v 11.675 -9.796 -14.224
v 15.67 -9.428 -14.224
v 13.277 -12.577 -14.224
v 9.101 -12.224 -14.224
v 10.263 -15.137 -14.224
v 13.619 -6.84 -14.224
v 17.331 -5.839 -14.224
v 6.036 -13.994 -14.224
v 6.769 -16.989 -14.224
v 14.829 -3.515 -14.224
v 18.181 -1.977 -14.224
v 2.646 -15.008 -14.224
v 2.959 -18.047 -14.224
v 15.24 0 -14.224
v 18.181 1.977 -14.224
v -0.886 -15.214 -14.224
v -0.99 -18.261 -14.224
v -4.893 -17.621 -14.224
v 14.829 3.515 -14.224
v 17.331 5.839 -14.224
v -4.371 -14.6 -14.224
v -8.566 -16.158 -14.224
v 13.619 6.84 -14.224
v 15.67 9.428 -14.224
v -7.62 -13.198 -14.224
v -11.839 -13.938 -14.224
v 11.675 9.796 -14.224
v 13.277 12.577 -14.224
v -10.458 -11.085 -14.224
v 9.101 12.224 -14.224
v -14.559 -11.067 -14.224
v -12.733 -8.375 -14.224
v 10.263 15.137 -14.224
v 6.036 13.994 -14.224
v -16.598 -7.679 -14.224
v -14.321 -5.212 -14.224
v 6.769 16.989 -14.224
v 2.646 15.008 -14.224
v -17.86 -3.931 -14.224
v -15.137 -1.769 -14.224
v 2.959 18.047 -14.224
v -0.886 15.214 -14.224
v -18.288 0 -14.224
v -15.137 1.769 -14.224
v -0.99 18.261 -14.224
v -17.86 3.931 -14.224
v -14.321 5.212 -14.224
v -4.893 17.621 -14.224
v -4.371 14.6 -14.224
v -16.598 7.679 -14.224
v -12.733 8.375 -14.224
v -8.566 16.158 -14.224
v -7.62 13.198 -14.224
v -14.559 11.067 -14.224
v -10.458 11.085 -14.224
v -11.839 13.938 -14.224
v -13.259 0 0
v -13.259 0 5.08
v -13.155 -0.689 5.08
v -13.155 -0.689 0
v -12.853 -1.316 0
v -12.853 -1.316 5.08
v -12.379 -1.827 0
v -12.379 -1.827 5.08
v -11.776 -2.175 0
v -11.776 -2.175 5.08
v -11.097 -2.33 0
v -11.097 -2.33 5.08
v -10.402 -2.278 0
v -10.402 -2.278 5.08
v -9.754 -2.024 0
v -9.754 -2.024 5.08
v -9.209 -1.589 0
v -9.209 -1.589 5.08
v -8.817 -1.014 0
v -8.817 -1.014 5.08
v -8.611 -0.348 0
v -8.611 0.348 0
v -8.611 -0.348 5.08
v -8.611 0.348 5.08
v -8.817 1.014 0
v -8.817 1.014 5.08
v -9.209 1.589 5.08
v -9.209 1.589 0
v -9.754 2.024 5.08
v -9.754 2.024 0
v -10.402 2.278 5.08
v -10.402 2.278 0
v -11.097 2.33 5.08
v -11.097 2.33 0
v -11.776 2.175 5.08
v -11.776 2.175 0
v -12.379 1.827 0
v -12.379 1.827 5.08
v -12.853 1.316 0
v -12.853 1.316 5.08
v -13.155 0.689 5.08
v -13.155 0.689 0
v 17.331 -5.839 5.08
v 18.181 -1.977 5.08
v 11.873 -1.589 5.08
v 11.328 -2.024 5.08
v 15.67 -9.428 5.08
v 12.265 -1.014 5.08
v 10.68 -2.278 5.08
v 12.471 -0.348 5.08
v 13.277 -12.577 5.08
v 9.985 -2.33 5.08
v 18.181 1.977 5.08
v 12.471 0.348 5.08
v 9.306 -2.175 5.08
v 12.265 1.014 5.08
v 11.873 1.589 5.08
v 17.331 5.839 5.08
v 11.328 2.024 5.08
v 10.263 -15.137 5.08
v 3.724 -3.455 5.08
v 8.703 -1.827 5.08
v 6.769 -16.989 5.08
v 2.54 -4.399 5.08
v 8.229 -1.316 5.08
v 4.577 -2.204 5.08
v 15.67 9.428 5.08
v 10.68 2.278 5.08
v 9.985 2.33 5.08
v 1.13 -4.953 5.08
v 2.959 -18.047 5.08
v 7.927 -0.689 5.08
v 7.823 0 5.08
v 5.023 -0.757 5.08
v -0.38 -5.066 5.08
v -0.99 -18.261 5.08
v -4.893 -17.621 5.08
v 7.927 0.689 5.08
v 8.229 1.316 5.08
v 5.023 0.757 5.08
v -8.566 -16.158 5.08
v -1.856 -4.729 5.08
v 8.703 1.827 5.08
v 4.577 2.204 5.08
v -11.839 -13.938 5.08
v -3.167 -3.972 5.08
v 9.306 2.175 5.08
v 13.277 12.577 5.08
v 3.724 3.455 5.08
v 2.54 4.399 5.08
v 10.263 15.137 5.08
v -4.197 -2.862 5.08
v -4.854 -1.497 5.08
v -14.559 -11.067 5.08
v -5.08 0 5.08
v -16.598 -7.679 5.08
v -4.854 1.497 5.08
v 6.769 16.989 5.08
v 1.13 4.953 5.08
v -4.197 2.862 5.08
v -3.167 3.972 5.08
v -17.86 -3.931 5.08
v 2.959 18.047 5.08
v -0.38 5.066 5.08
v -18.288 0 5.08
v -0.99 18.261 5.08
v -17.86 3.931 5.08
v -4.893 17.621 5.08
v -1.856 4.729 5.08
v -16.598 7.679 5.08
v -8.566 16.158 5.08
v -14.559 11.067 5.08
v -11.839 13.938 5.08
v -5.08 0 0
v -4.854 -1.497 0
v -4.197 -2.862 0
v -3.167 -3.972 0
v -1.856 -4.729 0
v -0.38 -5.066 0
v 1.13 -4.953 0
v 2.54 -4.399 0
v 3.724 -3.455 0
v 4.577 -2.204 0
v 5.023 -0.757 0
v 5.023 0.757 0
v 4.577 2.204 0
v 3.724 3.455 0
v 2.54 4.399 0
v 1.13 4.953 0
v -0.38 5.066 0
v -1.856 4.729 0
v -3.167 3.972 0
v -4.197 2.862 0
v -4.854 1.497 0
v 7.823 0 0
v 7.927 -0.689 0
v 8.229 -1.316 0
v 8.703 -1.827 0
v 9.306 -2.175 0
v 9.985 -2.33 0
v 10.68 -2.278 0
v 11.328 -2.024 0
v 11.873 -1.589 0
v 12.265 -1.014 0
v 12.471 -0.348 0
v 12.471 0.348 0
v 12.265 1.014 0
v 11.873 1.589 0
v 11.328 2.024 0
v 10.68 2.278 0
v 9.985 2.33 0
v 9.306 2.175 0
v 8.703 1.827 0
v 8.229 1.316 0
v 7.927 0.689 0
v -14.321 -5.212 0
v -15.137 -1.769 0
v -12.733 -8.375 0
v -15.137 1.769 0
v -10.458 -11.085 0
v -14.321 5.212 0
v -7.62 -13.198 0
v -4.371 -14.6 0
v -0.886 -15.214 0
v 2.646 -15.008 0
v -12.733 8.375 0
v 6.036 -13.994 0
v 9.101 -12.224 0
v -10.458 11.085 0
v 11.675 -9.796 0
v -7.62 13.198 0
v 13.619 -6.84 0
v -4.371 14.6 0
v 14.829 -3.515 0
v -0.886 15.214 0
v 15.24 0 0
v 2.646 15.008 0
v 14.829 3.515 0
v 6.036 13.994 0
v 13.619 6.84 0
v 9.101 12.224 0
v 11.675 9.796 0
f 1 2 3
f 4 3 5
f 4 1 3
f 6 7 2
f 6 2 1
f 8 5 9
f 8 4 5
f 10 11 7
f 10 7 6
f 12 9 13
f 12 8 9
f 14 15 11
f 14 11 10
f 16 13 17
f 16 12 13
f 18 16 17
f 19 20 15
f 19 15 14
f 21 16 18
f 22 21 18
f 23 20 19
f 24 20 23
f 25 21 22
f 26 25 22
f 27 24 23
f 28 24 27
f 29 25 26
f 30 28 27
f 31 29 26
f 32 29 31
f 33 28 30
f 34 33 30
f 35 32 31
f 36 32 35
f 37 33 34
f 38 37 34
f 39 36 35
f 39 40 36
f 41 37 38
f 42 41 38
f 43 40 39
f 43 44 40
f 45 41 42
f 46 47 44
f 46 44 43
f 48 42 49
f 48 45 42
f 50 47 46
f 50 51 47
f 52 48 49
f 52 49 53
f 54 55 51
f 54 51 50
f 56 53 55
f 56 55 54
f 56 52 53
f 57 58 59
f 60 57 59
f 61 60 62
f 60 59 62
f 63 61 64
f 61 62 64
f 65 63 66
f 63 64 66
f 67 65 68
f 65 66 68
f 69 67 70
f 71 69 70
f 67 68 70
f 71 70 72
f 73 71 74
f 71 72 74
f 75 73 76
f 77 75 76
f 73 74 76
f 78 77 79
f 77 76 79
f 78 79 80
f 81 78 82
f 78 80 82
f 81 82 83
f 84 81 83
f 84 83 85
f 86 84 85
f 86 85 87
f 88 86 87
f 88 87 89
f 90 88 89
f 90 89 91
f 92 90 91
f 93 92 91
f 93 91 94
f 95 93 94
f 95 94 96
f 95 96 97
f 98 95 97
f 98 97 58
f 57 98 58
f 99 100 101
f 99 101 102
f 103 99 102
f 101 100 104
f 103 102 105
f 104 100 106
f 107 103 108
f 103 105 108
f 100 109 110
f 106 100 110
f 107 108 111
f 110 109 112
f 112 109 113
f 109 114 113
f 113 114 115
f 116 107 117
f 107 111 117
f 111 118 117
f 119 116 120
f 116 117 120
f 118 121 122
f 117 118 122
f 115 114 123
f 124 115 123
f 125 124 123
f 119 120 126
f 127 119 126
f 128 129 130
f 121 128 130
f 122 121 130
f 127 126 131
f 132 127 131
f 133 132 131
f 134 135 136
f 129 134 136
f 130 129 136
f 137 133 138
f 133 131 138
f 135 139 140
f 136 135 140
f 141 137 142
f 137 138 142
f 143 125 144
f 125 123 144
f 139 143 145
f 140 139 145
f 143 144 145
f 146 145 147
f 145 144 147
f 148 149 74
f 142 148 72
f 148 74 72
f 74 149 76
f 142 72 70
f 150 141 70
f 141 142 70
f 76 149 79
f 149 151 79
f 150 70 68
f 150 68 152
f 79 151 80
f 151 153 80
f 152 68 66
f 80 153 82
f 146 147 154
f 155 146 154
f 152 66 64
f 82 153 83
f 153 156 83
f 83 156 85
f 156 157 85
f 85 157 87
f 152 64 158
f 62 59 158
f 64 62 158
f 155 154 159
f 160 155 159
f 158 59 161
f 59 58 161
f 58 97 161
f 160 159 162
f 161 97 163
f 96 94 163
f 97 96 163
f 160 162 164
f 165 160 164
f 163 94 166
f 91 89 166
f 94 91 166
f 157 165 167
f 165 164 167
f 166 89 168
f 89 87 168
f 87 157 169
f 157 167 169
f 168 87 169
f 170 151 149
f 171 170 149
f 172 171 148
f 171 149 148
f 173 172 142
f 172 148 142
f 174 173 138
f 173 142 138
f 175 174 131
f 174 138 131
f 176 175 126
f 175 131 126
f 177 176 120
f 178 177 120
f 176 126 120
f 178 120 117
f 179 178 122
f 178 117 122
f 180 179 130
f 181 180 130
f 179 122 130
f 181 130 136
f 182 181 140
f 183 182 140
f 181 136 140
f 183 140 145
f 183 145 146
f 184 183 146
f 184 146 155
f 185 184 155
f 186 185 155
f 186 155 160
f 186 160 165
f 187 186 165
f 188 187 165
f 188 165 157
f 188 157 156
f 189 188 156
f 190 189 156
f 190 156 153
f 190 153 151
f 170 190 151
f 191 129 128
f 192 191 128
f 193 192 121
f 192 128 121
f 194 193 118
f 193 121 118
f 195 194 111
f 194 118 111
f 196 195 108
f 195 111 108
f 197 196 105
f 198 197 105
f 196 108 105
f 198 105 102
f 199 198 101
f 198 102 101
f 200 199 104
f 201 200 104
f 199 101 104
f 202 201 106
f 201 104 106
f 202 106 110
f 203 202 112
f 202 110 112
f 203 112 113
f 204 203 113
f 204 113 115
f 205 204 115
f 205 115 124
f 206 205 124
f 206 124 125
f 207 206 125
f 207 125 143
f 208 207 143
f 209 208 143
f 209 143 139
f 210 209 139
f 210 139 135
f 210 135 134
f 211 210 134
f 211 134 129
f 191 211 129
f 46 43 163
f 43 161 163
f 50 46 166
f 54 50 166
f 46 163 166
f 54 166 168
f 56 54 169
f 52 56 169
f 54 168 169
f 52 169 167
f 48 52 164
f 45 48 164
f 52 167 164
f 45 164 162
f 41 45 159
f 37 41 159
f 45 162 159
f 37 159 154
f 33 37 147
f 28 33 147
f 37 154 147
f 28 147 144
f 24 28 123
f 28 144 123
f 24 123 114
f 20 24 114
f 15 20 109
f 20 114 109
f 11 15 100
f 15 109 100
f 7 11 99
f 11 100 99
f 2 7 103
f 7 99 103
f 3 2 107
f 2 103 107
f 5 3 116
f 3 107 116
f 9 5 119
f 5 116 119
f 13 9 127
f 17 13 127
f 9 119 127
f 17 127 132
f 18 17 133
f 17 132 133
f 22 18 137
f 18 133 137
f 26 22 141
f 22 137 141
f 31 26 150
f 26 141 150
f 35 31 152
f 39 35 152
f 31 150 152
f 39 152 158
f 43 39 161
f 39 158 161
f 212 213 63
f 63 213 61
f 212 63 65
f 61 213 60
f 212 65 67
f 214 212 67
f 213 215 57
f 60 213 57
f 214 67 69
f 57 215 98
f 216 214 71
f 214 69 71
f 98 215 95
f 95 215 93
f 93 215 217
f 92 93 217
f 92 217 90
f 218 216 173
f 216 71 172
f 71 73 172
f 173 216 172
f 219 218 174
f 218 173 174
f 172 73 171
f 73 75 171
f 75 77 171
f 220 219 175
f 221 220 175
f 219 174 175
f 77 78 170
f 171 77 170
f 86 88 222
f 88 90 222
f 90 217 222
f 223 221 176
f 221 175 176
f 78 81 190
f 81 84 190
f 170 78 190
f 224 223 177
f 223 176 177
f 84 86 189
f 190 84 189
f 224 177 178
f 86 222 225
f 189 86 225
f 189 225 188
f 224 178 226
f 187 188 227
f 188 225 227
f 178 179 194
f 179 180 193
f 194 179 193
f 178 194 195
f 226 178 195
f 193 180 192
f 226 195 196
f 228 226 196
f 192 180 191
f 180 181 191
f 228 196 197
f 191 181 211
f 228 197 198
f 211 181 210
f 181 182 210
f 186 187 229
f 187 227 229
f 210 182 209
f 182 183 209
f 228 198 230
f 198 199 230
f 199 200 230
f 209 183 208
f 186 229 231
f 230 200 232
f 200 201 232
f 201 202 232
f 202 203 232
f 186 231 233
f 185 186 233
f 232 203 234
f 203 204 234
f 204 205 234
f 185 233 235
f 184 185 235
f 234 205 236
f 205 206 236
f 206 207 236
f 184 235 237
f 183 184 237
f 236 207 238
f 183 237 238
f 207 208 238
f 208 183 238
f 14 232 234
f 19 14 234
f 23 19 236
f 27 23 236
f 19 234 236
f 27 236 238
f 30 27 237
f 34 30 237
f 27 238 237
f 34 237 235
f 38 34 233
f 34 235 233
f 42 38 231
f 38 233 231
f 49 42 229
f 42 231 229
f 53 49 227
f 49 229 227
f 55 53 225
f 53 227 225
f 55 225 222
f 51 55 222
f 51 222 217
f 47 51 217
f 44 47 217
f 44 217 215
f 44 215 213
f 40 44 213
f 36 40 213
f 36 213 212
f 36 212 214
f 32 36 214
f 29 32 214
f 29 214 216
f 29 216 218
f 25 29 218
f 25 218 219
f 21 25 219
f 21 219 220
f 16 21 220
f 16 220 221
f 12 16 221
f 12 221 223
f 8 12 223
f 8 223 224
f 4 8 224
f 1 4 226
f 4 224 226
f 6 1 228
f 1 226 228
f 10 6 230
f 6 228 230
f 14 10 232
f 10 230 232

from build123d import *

# Parameters (mm, degrees)
F0_W     = 18.2879995555
F0_H     = 19.3040007725
F3_D     = 30.48
F3_DEPTH = 16.51
F3_TIP   = 9.157115834
F5_D     = 10.16
F7_D     = 4.6736
F9_D     = 4.6736


with BuildPart() as f1:
    # F0 (on Front) → F1 (revolve)
    with BuildSketch(Plane.XZ):
        with Locations((-9.1439997777, -4.5719998889)):
            Rectangle(F0_W, F0_H)
    revolve(axis=Axis((0, 0, -4.5719998889), (0, 0, -1)))

    # F3 (one way)
    with BuildSketch(Plane.XY):
        with Locations((0, 0)):
            Circle(F3_D / 2)
    extrude(amount=-F3_DEPTH, mode=Mode.SUBTRACT)
    with Locations(Plane.XY):
        with Locations((0, 0)):
            with Locations((0, 0, -(F3_DEPTH + F3_TIP / 2))):  # 118° drill point
                Cone(0, F3_D / 2, F3_TIP, mode=Mode.SUBTRACT)

    # F5 (through all)
    with Locations(Plane(origin=(0, 0, 0), x_dir=(1, 0, 0), z_dir=(0, 0, -1))):
        with Locations((0, 0)):
            Hole(F5_D / 2)

    # F7 (through all)
    with Locations(Plane(origin=(0, 0, 0), x_dir=(1, 0, 0), z_dir=(0, 0, -1))):
        with Locations((-10.9219979495, 0)):
            Hole(F7_D / 2)

    # F9 (through all)
    with Locations(Plane(origin=(0, 0, 0), x_dir=(1, 0, 0), z_dir=(0, 0, -1))):
        with Locations((10.1600009948, 0)):
            Hole(F9_D / 2)


solid = f1.part
